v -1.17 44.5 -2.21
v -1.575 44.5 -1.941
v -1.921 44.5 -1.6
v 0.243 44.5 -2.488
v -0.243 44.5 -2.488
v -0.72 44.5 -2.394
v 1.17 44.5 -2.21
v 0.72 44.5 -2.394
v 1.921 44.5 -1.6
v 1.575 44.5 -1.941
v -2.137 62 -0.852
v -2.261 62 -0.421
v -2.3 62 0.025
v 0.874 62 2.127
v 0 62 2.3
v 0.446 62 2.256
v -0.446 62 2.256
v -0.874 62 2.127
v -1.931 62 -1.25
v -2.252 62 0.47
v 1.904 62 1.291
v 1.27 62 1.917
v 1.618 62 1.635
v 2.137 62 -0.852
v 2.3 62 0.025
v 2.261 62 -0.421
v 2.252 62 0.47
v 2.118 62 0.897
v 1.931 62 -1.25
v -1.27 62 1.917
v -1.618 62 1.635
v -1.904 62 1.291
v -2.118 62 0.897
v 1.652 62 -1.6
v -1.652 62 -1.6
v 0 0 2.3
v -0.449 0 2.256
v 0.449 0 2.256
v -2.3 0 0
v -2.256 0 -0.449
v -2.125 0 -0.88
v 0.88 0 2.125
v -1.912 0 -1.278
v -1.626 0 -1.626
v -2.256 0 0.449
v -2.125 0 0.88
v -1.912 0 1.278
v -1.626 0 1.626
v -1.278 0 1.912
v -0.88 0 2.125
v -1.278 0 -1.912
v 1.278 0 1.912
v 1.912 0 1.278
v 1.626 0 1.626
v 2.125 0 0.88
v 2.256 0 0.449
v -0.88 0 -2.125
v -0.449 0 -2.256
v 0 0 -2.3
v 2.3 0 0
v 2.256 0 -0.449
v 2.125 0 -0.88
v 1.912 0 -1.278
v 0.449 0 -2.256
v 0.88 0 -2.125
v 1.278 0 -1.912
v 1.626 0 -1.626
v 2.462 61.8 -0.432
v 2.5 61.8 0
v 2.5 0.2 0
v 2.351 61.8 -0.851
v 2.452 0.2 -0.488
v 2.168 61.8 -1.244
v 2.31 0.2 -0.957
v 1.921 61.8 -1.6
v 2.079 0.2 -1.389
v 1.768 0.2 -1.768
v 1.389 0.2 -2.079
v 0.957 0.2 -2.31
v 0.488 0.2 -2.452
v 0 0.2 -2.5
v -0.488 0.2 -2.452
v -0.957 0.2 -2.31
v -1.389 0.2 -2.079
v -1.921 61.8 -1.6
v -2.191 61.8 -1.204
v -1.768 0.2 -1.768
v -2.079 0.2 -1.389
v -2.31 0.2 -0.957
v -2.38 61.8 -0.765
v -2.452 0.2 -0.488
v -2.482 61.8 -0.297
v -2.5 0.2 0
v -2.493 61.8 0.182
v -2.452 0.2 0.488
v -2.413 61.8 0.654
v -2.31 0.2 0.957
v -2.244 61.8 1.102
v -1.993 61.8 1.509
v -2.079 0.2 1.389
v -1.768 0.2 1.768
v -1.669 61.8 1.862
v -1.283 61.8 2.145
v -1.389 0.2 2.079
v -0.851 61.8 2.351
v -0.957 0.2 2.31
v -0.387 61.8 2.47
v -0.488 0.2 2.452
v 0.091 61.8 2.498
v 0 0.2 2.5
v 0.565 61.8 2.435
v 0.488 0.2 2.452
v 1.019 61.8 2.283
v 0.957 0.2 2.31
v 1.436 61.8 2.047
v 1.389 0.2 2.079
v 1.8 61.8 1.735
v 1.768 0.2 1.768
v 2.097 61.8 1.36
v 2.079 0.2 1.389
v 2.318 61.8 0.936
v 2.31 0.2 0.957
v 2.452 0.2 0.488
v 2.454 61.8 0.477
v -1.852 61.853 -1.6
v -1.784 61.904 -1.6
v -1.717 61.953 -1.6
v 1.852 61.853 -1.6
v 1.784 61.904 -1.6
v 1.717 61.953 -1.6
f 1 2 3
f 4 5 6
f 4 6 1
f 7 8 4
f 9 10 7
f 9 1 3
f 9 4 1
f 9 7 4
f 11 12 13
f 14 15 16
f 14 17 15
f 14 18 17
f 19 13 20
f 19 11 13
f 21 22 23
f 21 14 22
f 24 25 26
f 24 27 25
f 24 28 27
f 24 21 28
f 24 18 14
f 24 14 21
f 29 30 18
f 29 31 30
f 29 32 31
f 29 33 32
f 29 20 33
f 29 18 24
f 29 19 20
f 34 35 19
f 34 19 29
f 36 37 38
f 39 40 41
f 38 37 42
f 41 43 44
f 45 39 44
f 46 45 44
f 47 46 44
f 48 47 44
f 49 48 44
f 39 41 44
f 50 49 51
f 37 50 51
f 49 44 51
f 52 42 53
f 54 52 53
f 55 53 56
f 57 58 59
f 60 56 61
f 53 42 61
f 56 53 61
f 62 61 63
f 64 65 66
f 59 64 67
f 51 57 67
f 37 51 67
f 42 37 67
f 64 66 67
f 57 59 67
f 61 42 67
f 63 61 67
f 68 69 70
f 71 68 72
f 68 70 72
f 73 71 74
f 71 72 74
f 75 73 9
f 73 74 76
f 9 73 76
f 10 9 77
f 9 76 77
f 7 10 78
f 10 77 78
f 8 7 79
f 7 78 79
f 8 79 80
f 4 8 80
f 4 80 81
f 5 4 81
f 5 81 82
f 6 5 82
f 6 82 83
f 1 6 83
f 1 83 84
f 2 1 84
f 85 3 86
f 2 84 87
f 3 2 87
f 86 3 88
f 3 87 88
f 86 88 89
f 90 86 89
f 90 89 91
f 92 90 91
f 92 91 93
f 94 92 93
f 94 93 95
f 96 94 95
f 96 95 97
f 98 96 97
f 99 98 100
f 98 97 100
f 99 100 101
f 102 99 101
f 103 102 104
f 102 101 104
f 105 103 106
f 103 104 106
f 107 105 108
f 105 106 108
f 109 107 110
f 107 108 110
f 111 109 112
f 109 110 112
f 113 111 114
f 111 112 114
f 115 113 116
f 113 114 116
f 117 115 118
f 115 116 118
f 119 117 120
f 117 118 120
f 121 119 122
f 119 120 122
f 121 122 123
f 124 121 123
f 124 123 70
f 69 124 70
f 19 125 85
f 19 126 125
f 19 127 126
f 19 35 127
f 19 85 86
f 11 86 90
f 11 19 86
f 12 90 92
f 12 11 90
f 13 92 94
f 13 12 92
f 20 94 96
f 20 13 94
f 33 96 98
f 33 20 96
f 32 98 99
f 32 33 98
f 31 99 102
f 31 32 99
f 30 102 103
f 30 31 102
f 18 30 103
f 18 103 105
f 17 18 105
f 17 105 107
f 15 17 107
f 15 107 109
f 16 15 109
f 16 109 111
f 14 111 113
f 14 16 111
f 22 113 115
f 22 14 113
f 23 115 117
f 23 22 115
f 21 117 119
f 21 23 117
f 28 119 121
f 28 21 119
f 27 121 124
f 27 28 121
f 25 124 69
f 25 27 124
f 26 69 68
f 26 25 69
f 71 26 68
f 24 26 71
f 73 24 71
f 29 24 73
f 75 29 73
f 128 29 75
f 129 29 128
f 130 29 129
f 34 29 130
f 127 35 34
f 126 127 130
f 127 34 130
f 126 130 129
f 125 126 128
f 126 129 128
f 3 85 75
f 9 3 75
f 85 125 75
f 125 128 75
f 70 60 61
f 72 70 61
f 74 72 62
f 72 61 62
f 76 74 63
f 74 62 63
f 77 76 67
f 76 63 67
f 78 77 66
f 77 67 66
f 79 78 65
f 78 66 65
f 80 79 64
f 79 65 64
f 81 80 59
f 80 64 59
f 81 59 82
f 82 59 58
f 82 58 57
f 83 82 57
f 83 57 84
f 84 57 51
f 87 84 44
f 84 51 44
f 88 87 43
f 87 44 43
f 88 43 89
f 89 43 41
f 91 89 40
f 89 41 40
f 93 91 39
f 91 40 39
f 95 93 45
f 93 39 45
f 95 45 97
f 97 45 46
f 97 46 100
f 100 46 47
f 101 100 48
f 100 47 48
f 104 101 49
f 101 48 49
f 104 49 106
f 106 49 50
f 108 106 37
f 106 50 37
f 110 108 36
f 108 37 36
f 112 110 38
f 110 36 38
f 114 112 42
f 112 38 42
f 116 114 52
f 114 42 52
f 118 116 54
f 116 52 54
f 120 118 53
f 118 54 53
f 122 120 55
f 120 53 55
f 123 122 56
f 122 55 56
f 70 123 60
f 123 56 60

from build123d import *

# Parameters (mm, degrees)
CROQUIS1_R              = 2.5
SALIENTE_EXTRUIR1_DEPTH = 62
CORTAR_EXTRUIR1_DEPTH   = 17.5
CHAFL_N1_SIZE           = 0.2


with BuildPart() as part:
    # Croquis1 → Saliente-Extruir1 (new body)
    with BuildSketch(Plane(origin=(0, 0, 0), x_dir=(1, 0, 0), z_dir=(0, 1, 0))):
        Circle(CROQUIS1_R)
    extrude(amount=SALIENTE_EXTRUIR1_DEPTH)

    # Croquis2 → Cortar-Extruir1 (cut)
    with BuildSketch(Plane(origin=(0, 62, 0), x_dir=(1, 0, 0), z_dir=(0, 1, 0))):
        with BuildLine():
            Line((-1.920937271, 1.6), (1.920937271, 1.6))
            ThreePointArc((1.920937271, 1.6), (0, 2.5), (-1.920937271, 1.6))
        make_face()
    extrude(amount=-CORTAR_EXTRUIR1_DEPTH, mode=Mode.SUBTRACT)

    # Chaflán1
    chafl_n1_edges = [part.edges().sort_by_distance(p)[0] for p in [
        (-0.850781059, 62, 2.350781059),
        (-2.5, 0, 0),
    ]]
    chamfer(chafl_n1_edges, length=CHAFL_N1_SIZE)


solid = part.part
